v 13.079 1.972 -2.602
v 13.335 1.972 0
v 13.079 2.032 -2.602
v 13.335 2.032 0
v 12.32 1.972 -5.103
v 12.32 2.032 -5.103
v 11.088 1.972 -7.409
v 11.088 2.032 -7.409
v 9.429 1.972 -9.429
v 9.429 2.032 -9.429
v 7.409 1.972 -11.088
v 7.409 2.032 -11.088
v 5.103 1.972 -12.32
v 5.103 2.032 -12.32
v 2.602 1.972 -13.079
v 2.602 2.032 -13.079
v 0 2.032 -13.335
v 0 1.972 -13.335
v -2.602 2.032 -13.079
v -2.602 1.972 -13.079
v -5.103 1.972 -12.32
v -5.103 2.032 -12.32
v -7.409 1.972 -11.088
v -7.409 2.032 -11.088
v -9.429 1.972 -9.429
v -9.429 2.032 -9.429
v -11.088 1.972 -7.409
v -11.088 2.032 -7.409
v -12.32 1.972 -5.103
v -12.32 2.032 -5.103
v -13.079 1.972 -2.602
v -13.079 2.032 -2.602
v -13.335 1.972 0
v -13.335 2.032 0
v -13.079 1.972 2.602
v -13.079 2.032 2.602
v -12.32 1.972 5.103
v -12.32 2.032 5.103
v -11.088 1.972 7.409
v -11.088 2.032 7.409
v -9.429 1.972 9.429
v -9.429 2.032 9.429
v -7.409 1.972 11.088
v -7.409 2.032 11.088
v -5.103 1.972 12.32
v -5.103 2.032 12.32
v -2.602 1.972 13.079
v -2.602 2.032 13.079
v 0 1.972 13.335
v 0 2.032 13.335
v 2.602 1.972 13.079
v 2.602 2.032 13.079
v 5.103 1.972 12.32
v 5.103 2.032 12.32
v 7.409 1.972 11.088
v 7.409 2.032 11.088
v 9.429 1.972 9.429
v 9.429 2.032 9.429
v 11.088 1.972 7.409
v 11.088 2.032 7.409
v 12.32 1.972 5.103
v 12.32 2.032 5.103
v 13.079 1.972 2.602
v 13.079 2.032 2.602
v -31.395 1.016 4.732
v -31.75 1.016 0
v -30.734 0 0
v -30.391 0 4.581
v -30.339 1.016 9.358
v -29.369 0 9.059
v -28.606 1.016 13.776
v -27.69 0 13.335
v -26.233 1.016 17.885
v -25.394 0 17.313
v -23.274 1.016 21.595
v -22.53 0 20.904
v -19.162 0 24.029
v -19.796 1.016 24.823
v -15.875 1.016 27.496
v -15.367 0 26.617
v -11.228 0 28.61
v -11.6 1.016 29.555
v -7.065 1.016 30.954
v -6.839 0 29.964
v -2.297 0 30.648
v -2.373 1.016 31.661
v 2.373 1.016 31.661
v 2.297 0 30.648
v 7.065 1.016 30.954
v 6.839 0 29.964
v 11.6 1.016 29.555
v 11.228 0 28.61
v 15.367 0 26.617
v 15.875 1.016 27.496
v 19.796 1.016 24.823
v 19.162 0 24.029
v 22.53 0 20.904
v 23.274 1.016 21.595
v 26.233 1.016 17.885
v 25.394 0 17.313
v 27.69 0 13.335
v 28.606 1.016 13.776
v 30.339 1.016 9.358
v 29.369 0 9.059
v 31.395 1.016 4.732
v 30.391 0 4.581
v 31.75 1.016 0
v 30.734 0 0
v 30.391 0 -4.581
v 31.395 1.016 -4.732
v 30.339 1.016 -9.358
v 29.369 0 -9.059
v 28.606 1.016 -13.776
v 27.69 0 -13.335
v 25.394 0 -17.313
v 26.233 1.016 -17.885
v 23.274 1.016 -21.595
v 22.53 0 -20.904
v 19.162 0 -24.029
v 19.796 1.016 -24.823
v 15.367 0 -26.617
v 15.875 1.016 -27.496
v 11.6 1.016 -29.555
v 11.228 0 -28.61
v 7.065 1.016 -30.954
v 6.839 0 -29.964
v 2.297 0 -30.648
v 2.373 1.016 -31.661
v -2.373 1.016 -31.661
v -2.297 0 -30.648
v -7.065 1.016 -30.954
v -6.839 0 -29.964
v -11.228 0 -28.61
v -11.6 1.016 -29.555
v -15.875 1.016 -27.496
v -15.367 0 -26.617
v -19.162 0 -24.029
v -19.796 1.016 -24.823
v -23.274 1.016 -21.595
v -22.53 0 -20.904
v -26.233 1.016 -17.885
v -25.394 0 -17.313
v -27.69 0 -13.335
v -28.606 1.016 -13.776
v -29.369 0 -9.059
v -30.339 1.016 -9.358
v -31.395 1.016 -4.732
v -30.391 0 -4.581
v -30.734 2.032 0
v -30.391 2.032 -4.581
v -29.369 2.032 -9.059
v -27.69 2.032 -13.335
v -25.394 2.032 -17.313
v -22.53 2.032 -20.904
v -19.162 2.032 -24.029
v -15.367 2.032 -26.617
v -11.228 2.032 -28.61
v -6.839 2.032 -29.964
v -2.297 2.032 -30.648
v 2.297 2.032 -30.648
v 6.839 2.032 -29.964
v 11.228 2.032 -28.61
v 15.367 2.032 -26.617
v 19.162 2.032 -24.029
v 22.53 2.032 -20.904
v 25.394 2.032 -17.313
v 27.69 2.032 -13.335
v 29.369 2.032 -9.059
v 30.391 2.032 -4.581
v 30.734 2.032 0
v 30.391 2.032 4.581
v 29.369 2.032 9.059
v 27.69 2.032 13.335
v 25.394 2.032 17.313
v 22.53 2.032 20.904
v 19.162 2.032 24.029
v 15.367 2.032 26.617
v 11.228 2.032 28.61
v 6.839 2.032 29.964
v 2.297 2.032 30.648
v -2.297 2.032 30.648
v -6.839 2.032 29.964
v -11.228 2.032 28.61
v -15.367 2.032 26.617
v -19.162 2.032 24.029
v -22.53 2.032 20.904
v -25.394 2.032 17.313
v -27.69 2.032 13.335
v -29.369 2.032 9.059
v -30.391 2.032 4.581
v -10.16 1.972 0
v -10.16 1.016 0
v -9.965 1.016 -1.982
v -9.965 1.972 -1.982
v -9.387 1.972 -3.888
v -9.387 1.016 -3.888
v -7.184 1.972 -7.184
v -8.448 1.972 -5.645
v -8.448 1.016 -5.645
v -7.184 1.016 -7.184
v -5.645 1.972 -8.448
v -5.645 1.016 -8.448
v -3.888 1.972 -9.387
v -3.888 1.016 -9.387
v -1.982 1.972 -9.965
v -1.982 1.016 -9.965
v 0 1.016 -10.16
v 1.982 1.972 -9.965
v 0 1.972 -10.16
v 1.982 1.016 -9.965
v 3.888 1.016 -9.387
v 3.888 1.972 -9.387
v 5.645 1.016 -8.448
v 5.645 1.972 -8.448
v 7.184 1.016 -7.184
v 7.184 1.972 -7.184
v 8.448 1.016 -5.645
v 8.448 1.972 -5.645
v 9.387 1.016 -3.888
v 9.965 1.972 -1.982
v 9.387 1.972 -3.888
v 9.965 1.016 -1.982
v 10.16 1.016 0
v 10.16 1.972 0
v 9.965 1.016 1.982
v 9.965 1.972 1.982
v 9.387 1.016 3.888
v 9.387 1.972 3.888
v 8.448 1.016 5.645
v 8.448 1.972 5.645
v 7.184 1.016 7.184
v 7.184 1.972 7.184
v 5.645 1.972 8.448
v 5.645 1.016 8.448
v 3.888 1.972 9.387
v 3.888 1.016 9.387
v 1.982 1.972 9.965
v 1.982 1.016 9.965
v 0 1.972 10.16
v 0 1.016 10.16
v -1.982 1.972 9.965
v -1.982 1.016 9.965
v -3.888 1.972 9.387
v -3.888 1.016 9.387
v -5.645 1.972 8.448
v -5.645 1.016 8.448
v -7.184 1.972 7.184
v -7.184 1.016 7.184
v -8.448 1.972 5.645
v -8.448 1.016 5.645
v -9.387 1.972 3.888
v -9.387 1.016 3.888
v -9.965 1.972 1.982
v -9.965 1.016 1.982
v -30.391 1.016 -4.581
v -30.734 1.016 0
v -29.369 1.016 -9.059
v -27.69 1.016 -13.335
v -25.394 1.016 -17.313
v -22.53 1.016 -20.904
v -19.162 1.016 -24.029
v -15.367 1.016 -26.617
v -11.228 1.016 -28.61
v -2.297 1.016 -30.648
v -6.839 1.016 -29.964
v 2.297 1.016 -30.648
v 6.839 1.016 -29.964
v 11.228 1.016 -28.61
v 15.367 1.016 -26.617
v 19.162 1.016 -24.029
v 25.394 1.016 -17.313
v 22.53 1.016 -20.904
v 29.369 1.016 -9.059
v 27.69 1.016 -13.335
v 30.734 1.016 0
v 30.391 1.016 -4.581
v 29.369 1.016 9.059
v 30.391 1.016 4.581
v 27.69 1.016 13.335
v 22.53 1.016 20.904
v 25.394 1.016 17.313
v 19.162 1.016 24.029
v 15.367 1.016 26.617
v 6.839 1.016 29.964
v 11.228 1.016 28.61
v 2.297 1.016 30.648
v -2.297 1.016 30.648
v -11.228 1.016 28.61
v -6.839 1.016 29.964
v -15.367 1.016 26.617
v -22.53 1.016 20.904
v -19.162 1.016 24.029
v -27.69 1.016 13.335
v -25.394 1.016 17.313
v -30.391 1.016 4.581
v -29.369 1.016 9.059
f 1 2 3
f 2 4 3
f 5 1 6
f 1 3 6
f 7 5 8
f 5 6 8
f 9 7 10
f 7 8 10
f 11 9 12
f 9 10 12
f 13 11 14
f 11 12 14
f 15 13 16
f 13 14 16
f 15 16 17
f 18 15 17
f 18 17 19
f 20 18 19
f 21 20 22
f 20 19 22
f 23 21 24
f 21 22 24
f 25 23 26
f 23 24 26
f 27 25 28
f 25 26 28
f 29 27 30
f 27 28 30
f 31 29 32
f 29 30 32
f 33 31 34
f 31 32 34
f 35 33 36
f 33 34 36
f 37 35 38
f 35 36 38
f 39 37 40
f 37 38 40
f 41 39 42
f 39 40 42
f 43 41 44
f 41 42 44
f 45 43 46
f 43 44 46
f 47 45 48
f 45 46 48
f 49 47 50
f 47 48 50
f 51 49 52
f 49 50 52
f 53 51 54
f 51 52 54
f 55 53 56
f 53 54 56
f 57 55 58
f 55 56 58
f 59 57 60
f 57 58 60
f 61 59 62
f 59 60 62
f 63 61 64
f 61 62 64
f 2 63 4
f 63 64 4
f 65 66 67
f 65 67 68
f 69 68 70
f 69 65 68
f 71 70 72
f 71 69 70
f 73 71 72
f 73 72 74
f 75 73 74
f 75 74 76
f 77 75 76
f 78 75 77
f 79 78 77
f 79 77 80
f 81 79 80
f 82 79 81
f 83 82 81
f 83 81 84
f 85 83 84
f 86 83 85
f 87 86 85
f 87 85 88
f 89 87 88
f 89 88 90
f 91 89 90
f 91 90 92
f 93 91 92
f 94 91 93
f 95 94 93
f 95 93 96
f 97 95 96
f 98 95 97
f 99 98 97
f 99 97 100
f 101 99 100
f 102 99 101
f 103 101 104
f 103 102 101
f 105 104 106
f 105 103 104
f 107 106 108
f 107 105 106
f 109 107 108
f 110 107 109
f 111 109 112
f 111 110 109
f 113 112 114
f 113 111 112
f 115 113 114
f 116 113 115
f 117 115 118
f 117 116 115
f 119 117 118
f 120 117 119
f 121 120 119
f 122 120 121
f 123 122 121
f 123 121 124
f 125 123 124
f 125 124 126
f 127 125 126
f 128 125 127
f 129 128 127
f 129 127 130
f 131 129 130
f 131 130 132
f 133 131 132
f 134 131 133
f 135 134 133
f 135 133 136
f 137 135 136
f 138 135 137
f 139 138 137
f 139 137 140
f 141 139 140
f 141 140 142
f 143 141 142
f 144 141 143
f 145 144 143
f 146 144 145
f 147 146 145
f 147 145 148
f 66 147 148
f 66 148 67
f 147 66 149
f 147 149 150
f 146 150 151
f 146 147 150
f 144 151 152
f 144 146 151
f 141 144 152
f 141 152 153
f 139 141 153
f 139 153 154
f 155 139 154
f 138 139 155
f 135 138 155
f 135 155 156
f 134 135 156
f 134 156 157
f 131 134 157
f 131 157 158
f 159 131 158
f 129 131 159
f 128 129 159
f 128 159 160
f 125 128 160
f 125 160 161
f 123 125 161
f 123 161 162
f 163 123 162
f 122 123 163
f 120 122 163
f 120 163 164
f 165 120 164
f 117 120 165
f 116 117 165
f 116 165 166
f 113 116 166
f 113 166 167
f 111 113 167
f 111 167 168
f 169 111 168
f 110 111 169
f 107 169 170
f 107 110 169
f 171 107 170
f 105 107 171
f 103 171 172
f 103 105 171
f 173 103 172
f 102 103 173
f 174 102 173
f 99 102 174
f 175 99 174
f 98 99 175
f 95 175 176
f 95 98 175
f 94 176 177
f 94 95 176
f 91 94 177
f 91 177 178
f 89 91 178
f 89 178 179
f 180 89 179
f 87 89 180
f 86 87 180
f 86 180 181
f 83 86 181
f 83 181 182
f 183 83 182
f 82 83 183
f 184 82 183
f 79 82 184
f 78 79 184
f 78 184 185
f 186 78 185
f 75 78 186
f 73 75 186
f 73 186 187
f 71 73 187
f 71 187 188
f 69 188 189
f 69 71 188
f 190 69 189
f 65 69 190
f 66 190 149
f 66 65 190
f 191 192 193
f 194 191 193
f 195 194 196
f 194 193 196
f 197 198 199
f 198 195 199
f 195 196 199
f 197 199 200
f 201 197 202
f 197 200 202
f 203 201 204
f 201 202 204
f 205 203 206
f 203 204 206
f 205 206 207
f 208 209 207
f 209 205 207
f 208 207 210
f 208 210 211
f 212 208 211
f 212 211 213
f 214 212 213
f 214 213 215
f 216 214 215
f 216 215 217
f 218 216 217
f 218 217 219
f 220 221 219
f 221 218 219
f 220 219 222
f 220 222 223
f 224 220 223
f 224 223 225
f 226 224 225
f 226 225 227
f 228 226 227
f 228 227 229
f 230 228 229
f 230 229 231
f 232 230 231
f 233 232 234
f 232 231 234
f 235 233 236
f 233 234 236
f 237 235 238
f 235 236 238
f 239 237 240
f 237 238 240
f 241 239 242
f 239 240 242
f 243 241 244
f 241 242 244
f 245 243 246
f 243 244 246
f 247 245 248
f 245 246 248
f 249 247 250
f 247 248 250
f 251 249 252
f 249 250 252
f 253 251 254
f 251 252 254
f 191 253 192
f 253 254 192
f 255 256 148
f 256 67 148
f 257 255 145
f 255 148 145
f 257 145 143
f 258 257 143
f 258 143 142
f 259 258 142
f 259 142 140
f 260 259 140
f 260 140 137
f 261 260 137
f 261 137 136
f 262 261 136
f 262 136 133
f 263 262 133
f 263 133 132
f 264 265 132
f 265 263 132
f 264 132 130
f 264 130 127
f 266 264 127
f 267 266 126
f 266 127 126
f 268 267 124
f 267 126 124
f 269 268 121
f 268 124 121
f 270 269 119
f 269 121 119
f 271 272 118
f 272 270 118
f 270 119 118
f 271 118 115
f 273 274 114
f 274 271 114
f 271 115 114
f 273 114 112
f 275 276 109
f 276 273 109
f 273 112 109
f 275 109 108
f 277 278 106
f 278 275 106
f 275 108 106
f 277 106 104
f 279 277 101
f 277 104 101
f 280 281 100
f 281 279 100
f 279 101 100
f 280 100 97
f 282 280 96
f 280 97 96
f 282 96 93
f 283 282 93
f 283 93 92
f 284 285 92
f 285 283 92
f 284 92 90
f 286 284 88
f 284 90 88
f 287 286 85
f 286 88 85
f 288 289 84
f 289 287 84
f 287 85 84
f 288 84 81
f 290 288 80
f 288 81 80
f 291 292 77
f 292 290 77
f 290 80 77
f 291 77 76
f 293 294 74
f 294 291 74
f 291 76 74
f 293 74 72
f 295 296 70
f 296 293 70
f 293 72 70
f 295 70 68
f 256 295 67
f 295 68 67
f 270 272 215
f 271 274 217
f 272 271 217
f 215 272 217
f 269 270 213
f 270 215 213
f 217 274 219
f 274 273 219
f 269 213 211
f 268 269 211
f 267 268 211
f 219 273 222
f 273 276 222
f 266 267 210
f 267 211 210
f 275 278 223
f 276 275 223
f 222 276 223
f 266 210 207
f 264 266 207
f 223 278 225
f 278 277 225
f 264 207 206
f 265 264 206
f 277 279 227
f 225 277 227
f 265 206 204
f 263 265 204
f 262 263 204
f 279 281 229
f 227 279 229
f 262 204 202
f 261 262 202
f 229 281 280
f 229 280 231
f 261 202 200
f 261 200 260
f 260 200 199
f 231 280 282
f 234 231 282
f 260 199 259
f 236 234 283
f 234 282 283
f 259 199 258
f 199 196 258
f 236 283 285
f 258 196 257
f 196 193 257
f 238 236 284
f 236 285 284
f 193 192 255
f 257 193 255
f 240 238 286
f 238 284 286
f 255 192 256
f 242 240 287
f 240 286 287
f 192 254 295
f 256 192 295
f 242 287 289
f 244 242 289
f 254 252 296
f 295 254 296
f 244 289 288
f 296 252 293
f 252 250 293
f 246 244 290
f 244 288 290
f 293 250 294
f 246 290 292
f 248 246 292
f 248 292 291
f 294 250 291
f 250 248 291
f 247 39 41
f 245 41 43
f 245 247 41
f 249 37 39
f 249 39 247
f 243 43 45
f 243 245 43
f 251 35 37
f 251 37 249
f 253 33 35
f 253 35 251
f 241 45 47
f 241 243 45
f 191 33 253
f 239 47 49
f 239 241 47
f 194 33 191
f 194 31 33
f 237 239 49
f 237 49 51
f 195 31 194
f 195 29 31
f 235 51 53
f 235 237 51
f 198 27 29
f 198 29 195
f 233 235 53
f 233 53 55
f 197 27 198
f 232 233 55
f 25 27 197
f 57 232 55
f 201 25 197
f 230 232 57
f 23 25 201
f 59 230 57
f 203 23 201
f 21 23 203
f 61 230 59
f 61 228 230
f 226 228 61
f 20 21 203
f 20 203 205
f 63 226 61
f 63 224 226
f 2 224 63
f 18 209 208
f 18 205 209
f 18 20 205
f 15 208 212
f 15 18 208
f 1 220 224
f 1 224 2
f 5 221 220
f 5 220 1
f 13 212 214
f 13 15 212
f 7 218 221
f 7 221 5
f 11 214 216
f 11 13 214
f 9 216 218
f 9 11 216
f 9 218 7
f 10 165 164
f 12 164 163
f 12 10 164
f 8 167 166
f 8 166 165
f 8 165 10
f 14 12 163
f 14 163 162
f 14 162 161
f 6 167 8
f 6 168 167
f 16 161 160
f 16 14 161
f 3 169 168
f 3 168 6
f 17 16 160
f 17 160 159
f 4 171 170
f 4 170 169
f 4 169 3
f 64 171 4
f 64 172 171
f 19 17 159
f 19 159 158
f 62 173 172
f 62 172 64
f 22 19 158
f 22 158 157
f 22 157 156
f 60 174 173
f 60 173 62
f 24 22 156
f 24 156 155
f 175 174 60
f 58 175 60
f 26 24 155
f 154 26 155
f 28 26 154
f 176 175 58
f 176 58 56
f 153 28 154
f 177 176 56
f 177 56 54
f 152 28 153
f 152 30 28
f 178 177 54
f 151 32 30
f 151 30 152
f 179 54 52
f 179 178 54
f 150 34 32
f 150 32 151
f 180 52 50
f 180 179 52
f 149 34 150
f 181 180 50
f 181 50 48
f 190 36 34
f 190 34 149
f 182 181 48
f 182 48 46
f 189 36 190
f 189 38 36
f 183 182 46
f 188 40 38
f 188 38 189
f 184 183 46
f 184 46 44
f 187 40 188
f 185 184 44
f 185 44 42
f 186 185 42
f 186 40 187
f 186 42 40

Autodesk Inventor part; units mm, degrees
ref_plane "YZ Plane" through (0, 0, 0) normal (1, 0, 0) x (0, 1, 0)
ref_plane "XZ Plane" through (0, 0, 0) normal (0, 1, 0) x (-1, 0, 0)
ref_plane "XY Plane" through (0, 0, 0) normal (0, 0, 1) x (1, 0, 0)
sketch "Sketch1" plane through (0, 0, 0) normal (0, 1, 0) x (-1, 0, 0)
  circle A0 centre (0, 0) radius 31.75
  circle A1 centre (0, 0) radius 10.16
  dimension "d0" = 63.5
  dimension "d1" = 20.32
extrude "Extrusion1" add sketch "Sketch1" along normal blind 2.032
sketch "Sketch2" plane through (0, 2.032, 0) normal (0, 1, 0) x (1, 0, 0)
  circle A0 centre (0, 0) radius 10.16 projected
  circle A1 centre (0, 0) radius 31.75 projected
  circle A2 centre (0, 0) radius 13.335
  dimension "d4" = 26.67
extrude "Extrusion2" cut sketch "Sketch2" against normal blind 0.06 contours A2
chamfer "Chamfer1" distance 1.016 angle 45 2 edges at (31.75, 2.032, 0) (31.75, 0, 0)
sketch "Sketch3" plane through (0, 0, 0) normal (0, -1, 0) x (1, 0, 0)
  circle A0 centre (0, 0) radius 10.16 projected
  circle A1 centre (0, 0) radius 30.734 projected
emboss "Emboss1" sketch "Sketch3" operation cut depth 1.016 direction (0, 1, 0)
properties part number "Si Frame Mk 3"
